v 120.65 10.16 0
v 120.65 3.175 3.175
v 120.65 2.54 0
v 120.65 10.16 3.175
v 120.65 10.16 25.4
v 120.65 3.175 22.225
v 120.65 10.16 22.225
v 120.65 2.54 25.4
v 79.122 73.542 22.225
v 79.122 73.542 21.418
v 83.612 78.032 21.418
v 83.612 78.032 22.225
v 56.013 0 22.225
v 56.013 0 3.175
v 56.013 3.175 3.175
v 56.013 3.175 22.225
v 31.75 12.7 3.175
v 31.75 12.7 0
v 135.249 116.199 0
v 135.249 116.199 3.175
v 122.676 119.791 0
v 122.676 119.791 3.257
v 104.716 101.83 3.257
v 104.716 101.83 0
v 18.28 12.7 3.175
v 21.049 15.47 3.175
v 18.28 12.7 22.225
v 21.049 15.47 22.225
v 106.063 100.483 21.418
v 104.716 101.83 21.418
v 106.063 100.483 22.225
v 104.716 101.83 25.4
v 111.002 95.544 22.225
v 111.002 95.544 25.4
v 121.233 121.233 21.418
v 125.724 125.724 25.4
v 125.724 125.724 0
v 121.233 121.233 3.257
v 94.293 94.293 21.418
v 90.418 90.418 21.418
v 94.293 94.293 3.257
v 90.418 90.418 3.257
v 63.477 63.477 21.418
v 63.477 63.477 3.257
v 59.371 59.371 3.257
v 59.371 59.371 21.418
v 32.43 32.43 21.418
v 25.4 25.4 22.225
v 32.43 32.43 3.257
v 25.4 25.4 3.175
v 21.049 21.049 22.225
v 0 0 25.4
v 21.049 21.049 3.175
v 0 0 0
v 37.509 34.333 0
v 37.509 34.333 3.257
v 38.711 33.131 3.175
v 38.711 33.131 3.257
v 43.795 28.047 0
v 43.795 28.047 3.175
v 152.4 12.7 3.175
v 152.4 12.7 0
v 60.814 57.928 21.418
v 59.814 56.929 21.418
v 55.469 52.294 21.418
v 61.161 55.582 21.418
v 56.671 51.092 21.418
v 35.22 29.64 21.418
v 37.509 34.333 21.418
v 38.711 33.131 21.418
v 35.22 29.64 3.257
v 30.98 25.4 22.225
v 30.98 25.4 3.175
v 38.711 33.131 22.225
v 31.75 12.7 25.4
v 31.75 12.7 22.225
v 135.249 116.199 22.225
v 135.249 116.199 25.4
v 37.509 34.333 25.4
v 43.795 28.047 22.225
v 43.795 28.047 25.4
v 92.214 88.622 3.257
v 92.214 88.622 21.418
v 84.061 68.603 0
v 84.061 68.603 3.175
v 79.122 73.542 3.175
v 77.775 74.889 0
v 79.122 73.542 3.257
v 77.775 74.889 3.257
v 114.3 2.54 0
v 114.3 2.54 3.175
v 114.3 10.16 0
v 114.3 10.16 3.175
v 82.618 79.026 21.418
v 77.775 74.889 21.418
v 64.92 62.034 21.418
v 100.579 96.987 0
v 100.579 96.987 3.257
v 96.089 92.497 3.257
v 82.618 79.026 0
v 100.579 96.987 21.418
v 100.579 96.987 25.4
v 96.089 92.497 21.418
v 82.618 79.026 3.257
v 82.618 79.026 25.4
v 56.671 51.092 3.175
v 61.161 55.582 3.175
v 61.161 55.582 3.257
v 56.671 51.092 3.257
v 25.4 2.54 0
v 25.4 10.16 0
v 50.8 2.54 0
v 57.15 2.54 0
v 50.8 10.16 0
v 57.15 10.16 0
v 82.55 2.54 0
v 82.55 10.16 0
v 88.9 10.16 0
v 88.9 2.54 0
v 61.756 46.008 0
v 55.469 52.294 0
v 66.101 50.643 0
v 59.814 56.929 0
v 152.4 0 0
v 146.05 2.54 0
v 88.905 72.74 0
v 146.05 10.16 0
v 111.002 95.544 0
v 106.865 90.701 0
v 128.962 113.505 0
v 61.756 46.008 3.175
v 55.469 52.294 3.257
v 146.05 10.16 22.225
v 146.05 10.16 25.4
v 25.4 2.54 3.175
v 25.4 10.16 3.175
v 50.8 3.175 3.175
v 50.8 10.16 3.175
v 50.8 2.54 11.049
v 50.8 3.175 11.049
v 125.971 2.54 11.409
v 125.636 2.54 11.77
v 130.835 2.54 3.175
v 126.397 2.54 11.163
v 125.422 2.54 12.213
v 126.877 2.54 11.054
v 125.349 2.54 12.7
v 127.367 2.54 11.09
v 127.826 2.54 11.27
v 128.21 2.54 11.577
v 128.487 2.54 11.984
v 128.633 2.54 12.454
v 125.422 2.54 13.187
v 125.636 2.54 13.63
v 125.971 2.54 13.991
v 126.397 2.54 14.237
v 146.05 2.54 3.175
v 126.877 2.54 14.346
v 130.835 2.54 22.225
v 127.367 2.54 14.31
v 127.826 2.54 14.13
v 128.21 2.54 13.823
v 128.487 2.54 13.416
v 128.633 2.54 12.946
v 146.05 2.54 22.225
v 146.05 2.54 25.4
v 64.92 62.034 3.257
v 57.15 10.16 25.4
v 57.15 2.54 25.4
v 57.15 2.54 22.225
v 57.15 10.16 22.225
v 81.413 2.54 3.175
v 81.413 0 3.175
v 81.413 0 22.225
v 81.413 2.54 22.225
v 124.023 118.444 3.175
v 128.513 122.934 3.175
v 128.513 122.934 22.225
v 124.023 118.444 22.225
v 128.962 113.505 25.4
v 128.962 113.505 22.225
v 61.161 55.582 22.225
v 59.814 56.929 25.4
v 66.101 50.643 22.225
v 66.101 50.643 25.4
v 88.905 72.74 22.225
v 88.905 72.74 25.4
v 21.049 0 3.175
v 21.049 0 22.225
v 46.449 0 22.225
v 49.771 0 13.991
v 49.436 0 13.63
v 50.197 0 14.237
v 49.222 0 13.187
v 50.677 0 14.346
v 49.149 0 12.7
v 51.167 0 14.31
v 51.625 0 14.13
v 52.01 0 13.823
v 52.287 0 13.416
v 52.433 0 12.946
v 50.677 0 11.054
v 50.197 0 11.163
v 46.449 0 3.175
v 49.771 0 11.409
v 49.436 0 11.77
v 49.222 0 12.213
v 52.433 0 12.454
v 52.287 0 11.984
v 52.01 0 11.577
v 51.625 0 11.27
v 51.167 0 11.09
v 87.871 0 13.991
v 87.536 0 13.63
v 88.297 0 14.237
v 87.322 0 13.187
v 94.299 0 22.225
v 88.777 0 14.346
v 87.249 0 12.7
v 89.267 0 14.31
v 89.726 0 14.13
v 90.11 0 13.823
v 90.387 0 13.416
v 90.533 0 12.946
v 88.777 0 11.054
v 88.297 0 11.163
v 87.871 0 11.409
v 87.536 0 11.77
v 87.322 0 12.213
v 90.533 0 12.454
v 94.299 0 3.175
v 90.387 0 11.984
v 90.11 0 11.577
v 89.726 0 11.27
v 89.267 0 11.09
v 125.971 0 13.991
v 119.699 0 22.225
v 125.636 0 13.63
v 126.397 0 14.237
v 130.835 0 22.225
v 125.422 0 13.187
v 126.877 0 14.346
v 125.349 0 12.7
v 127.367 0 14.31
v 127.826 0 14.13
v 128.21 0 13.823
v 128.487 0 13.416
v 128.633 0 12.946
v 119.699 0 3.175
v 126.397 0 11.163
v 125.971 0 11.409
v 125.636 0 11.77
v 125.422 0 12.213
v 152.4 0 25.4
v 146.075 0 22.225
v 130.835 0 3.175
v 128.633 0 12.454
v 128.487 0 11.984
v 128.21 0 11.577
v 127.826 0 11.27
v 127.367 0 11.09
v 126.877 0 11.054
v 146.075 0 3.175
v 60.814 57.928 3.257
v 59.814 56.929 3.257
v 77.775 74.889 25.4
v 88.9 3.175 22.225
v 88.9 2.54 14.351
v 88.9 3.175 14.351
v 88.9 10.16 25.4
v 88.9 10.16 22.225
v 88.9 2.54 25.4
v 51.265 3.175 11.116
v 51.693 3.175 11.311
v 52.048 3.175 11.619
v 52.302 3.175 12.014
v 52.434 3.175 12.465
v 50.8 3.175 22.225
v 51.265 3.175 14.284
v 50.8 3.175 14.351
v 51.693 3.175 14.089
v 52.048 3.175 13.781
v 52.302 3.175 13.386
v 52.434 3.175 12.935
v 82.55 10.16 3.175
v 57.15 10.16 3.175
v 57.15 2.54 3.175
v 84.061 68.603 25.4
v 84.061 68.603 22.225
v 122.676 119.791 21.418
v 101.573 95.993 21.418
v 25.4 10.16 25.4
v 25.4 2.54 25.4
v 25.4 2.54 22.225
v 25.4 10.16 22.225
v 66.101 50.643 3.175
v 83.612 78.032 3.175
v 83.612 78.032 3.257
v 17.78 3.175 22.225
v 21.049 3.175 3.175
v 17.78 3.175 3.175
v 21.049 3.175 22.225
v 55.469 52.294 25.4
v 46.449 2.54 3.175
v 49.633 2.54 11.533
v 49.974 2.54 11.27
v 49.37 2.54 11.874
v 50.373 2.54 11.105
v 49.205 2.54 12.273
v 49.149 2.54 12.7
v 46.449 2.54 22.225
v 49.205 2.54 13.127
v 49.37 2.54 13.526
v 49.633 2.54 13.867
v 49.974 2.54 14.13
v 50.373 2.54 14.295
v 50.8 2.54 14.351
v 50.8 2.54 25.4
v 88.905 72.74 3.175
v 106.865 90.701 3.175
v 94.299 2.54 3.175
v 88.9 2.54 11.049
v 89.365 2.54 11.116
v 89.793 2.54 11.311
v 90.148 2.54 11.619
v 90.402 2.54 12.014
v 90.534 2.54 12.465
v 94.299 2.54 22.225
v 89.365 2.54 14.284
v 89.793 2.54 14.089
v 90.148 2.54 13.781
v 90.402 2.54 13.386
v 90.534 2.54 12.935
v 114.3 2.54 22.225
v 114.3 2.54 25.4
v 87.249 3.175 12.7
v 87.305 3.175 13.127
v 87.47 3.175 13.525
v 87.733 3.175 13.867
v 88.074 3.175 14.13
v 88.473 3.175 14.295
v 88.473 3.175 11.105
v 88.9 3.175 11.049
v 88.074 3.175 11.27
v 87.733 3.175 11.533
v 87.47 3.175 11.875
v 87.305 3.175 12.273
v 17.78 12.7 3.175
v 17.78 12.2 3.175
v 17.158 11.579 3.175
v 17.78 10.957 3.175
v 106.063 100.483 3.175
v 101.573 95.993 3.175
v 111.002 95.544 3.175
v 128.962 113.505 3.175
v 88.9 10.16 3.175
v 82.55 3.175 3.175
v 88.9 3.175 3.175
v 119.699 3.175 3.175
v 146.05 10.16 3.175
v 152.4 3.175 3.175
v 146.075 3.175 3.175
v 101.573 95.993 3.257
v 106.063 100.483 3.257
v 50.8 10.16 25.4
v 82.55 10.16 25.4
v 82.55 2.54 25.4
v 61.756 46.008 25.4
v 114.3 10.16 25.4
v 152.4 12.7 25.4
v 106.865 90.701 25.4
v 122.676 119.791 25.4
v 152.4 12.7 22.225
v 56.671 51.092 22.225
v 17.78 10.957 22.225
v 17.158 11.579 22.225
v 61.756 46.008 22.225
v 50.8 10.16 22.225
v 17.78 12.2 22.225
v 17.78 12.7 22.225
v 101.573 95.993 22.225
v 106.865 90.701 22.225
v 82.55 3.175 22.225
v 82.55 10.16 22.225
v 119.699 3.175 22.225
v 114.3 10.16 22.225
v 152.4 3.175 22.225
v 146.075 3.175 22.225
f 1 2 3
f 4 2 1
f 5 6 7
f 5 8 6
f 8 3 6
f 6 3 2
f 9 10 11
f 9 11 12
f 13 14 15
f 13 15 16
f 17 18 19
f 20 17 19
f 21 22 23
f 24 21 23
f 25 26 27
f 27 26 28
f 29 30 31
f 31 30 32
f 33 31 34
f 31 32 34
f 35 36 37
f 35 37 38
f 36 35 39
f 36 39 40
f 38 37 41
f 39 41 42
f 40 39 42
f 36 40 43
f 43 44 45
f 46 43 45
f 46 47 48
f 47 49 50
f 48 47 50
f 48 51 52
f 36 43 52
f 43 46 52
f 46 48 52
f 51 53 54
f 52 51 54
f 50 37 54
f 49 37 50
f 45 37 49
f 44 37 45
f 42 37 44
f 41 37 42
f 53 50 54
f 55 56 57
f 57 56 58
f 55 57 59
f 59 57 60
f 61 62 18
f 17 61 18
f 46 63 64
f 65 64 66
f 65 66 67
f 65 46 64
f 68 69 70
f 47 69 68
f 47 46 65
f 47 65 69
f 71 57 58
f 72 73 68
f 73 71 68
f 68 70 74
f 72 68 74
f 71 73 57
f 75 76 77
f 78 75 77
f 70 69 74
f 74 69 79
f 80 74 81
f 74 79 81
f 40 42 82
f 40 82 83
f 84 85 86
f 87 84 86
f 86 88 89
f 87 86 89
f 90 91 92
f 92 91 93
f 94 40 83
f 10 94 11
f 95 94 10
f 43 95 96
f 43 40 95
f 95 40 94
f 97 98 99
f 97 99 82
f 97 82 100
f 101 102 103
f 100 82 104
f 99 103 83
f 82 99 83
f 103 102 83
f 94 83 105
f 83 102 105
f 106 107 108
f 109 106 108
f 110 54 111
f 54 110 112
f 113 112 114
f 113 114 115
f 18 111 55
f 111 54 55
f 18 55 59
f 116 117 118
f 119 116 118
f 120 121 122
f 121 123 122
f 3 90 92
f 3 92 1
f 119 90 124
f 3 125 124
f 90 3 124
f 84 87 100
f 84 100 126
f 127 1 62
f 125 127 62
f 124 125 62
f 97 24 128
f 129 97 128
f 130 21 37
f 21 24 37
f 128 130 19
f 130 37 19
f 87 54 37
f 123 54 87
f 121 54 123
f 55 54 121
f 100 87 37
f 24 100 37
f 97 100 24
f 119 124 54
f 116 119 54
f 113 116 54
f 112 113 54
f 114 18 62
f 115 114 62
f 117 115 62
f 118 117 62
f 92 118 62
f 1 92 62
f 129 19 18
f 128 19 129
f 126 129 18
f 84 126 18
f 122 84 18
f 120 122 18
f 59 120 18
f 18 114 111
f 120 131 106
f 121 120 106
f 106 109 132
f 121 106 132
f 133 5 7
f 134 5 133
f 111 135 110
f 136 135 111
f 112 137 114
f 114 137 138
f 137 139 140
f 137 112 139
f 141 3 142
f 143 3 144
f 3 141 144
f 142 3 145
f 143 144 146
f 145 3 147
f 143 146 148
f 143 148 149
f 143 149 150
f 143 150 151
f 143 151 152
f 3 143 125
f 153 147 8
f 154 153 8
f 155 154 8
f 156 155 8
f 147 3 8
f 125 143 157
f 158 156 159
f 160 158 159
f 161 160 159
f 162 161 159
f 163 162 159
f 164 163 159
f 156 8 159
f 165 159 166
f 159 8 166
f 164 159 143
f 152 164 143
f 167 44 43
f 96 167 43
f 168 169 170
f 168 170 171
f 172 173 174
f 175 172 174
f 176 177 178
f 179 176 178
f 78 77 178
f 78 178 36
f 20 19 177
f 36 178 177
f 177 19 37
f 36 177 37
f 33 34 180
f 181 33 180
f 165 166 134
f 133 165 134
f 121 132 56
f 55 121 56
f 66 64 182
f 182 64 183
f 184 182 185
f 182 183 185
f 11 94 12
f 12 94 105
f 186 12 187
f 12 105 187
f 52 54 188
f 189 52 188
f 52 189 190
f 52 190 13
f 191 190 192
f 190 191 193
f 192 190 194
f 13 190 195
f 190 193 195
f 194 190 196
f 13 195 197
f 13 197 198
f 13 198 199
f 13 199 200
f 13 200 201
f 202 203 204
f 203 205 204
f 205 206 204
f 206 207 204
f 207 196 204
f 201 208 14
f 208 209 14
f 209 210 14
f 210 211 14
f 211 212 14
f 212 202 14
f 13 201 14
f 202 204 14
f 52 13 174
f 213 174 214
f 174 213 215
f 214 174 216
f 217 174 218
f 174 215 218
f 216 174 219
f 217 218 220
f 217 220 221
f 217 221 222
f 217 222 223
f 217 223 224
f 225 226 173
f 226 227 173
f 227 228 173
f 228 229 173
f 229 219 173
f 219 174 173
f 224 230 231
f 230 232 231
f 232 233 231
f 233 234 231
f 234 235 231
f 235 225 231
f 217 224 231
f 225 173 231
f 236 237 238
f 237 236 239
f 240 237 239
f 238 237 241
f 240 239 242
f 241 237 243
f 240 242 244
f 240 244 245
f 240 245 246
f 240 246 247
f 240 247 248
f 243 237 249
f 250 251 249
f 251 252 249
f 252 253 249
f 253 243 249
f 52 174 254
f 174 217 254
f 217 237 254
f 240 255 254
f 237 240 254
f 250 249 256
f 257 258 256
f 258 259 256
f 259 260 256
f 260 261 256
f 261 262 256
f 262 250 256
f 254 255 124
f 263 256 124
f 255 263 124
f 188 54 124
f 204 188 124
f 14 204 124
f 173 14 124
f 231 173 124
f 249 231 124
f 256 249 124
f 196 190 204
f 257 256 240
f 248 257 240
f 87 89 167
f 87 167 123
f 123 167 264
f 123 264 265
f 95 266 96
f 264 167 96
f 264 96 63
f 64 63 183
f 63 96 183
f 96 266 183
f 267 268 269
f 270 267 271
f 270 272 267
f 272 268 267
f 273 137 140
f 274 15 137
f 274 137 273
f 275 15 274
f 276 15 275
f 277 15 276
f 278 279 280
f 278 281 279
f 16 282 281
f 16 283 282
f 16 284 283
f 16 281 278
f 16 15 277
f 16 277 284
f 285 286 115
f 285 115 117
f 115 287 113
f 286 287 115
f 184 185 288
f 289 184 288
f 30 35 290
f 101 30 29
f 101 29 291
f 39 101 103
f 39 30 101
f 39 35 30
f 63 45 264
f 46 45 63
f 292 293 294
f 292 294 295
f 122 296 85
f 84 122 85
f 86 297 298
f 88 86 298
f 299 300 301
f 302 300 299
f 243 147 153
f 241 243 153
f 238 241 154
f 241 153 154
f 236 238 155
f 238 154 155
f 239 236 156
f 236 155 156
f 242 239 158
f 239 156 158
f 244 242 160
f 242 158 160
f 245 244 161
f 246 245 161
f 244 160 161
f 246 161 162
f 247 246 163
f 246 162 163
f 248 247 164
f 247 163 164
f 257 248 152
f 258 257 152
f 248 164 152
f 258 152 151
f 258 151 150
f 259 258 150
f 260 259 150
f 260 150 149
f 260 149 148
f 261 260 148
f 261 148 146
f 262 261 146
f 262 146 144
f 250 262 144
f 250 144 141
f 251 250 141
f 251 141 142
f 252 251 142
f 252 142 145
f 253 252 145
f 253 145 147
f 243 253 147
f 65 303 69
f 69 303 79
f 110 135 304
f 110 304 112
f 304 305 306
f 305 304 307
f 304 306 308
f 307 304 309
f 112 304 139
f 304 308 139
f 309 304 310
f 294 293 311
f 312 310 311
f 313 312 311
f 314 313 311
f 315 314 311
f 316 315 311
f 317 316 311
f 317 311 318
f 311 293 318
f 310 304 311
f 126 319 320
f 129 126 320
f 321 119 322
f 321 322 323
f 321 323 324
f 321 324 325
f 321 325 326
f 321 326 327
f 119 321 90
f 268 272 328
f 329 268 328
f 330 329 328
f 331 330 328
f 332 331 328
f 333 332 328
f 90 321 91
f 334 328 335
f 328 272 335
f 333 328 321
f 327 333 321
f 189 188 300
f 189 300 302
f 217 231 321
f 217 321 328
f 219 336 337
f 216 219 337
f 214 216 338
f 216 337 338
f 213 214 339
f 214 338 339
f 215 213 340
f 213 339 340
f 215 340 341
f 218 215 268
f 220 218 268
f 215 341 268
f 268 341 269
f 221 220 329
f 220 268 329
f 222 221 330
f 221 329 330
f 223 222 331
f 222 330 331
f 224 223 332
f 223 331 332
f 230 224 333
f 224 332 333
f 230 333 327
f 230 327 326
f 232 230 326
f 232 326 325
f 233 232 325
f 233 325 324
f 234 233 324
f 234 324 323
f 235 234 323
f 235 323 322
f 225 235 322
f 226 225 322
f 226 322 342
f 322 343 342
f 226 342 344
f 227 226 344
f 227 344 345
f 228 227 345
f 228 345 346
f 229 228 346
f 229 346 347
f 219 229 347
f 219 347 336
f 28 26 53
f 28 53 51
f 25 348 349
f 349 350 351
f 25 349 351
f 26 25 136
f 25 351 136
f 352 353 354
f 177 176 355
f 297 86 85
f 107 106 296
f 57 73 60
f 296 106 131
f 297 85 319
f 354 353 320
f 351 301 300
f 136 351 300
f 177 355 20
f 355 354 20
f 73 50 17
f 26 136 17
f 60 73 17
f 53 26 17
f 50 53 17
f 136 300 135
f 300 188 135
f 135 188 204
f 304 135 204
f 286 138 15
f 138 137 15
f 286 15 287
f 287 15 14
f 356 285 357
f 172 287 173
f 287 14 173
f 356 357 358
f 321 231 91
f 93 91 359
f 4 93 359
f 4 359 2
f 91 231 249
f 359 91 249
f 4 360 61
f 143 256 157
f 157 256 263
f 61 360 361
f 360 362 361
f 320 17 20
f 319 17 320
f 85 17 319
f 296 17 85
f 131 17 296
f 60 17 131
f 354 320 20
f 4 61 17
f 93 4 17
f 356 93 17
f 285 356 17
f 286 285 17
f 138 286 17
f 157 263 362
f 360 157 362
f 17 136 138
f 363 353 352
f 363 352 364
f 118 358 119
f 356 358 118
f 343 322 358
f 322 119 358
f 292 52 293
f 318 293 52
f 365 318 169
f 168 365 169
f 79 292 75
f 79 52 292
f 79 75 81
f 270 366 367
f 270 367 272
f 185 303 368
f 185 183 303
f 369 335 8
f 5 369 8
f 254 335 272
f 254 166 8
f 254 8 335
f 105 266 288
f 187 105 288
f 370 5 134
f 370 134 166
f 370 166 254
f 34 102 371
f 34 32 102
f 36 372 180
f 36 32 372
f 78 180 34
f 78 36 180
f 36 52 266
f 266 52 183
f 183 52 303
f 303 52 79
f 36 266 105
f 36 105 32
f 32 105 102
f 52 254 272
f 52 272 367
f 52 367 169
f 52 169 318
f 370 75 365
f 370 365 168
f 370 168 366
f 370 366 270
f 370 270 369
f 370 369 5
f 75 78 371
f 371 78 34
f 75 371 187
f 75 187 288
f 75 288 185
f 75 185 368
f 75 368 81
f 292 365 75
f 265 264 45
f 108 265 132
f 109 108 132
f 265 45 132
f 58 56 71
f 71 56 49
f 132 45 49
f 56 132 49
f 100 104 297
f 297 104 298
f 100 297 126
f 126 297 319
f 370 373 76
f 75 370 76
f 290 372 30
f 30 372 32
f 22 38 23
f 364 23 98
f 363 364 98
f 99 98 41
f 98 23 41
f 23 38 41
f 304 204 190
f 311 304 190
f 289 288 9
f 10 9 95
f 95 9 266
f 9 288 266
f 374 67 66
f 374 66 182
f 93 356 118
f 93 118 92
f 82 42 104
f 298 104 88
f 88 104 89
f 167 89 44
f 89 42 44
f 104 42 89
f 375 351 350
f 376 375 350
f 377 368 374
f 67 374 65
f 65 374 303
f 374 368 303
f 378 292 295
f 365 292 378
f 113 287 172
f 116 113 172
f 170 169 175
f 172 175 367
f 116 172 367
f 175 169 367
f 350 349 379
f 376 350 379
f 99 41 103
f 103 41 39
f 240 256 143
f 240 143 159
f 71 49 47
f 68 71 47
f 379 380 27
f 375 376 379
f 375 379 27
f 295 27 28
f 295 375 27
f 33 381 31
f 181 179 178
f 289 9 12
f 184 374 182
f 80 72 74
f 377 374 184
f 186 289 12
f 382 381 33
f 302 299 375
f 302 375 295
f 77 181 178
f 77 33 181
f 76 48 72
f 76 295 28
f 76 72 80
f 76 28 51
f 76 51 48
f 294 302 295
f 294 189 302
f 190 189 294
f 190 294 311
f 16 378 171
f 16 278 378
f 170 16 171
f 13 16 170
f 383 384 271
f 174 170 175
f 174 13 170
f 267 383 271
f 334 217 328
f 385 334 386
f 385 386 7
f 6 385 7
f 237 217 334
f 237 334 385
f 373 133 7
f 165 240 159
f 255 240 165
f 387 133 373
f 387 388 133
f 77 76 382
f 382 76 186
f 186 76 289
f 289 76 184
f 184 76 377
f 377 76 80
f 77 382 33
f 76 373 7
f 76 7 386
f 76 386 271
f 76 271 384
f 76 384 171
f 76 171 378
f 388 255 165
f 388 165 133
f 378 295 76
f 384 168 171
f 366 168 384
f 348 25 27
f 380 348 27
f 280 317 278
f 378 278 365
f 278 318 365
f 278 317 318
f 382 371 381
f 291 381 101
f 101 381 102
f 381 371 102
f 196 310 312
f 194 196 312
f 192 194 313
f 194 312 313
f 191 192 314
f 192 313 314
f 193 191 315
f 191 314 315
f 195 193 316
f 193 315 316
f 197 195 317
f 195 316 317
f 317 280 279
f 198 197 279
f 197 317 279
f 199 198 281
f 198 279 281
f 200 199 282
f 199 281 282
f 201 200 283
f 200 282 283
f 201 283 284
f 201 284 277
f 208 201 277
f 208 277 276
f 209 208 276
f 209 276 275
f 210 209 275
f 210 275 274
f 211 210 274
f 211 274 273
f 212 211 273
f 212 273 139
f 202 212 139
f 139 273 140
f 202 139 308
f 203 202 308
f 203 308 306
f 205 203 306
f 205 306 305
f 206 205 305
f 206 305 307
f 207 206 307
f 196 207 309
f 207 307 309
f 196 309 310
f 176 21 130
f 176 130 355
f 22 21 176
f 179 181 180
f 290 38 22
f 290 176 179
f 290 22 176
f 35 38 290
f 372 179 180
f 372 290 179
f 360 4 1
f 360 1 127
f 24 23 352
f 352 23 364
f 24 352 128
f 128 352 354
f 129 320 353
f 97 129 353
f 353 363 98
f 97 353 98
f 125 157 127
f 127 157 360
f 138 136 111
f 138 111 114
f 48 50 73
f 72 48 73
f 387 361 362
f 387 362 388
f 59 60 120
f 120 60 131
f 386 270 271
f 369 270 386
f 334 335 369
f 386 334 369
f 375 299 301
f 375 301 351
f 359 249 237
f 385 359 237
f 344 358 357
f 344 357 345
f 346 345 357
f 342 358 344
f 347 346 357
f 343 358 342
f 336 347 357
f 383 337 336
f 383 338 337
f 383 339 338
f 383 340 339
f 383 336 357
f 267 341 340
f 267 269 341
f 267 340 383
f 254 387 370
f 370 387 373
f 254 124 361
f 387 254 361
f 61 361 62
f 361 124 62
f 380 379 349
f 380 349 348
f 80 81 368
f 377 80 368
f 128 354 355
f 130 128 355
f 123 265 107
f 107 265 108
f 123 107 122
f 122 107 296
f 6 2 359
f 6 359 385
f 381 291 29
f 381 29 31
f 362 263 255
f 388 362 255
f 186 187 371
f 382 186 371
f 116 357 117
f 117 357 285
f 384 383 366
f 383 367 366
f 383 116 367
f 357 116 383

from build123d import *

# Parameters (mm, degrees)
F1_DEPTH  = 25.4
F2_W      = 9.525
F2_H      = 19.05
F3_DEPTH  = 134.62
F4_W      = 9.525
F4_H      = 19.05
F5_DEPTH  = 157.48
F6_R      = 1.651
F7_DEPTH  = 25.4
F8_W      = 25.4
F8_H      = 7.62
F9_DEPTH  = 101.6
F10_W     = 15.24
F10_H     = 19.05
F10_W_2   = 25.4
F11_DEPTH = 25.4
F12_W     = 38.1
F12_H     = 18.161
F13_DEPTH = 25.4


with BuildPart() as f1:
    # F0 (on Top) → F1 (new body)
    with BuildSketch(Plane.XY):
        Polygon((125.723586, 125.723586), (0, 0), (152.4, 0), (152.4, 12.7), (31.75, 12.7), (135.248586, 116.198586), align=None)
    extrude(amount=F1_DEPTH)

    # F2 (on face) → F3 (cut)
    with BuildSketch(Plane.YZ.offset(152.4)):
        with Locations((7.9375, 12.7)):
            Rectangle(F2_W, F2_H)
    extrude(amount=-F3_DEPTH, mode=Mode.SUBTRACT)

    # F4 (on face) → F5 (cut)
    with BuildSketch(Plane(origin=(125.723586, 125.723586, 0), x_dir=(-0.707107, 0.707107, 0), z_dir=(0.707107, 0.707107, 0))):
        with Locations((-8.707884, 12.7)):
            Rectangle(F4_W, F4_H)
    extrude(amount=-F5_DEPTH, mode=Mode.SUBTRACT)

    # F6 (on face) → F7 (cut)
    with BuildSketch(Plane(origin=(0, 3.175, 0), x_dir=(-1, 0, 0), z_dir=(0, 1, 0))):
        with Locations((-88.9, 12.7)):
            Circle(F6_R)
        with Locations((-50.8, 12.7)):
            Circle(F6_R)
        with Locations((-127, 12.7)):
            Circle(F6_R)
    extrude(amount=-F7_DEPTH, mode=Mode.SUBTRACT)

    # F8 (on face) → F9 (cut)
    with BuildSketch(Plane.XY.offset(25.4)):
        with Locations((38.1, 6.35)):
            Rectangle(F8_W, F8_H)
        with Locations((69.85, 6.35)):
            Rectangle(F8_W, F8_H)
        with Locations((101.6, 6.35)):
            Rectangle(F8_W, F8_H)
        with Locations((133.35, 6.35)):
            Rectangle(F8_W, F8_H)
        Polygon((128.962406, 113.504509), (122.676227, 119.790688), (104.715715, 101.830176), (111.001894, 95.543997), align=None)
        Polygon((106.865048, 90.700587), (100.578869, 96.986766), (82.618356, 79.026254), (88.904536, 72.740075), align=None)
        Polygon((84.061126, 68.603228), (77.774947, 74.889408), (59.814434, 56.928895), (66.100614, 50.642716), align=None)
        Polygon((61.755537, 46.007537), (55.469357, 52.293716), (37.508845, 34.333204), (43.795024, 28.047025), align=None)
    extrude(amount=-F9_DEPTH, mode=Mode.SUBTRACT)

    # F10 (on face) → F11 (cut)
    with BuildSketch(Plane.XZ):
        with Locations((138.455176, 12.7)):
            Rectangle(F10_W, F10_H)
        with Locations((106.998765, 12.7)):
            Rectangle(F10_W_2, F10_H)
        with Locations((68.713241, 12.7)):
            Rectangle(F10_W_2, F10_H)
        with Locations((33.749367, 12.7)):
            Rectangle(F10_W_2, F10_H)
    extrude(amount=-F11_DEPTH, mode=Mode.SUBTRACT)

    # F12 (on face) → F13 (cut)
    with BuildSketch(Plane(origin=(0, 0, 0), x_dir=(-0.707107, -0.707107, 0), z_dir=(-0.707107, 0.707107, 0))):
        with Locations((-108.820044, 12.337992)):
            Rectangle(F12_W, F12_H)
        with Locations((-152.4, 12.337992)):
            Rectangle(F12_W, F12_H)
        with Locations((-64.913327, 12.337992)):
            Rectangle(F12_W, F12_H)
    extrude(amount=-F13_DEPTH, mode=Mode.SUBTRACT)


solid = f1.part
